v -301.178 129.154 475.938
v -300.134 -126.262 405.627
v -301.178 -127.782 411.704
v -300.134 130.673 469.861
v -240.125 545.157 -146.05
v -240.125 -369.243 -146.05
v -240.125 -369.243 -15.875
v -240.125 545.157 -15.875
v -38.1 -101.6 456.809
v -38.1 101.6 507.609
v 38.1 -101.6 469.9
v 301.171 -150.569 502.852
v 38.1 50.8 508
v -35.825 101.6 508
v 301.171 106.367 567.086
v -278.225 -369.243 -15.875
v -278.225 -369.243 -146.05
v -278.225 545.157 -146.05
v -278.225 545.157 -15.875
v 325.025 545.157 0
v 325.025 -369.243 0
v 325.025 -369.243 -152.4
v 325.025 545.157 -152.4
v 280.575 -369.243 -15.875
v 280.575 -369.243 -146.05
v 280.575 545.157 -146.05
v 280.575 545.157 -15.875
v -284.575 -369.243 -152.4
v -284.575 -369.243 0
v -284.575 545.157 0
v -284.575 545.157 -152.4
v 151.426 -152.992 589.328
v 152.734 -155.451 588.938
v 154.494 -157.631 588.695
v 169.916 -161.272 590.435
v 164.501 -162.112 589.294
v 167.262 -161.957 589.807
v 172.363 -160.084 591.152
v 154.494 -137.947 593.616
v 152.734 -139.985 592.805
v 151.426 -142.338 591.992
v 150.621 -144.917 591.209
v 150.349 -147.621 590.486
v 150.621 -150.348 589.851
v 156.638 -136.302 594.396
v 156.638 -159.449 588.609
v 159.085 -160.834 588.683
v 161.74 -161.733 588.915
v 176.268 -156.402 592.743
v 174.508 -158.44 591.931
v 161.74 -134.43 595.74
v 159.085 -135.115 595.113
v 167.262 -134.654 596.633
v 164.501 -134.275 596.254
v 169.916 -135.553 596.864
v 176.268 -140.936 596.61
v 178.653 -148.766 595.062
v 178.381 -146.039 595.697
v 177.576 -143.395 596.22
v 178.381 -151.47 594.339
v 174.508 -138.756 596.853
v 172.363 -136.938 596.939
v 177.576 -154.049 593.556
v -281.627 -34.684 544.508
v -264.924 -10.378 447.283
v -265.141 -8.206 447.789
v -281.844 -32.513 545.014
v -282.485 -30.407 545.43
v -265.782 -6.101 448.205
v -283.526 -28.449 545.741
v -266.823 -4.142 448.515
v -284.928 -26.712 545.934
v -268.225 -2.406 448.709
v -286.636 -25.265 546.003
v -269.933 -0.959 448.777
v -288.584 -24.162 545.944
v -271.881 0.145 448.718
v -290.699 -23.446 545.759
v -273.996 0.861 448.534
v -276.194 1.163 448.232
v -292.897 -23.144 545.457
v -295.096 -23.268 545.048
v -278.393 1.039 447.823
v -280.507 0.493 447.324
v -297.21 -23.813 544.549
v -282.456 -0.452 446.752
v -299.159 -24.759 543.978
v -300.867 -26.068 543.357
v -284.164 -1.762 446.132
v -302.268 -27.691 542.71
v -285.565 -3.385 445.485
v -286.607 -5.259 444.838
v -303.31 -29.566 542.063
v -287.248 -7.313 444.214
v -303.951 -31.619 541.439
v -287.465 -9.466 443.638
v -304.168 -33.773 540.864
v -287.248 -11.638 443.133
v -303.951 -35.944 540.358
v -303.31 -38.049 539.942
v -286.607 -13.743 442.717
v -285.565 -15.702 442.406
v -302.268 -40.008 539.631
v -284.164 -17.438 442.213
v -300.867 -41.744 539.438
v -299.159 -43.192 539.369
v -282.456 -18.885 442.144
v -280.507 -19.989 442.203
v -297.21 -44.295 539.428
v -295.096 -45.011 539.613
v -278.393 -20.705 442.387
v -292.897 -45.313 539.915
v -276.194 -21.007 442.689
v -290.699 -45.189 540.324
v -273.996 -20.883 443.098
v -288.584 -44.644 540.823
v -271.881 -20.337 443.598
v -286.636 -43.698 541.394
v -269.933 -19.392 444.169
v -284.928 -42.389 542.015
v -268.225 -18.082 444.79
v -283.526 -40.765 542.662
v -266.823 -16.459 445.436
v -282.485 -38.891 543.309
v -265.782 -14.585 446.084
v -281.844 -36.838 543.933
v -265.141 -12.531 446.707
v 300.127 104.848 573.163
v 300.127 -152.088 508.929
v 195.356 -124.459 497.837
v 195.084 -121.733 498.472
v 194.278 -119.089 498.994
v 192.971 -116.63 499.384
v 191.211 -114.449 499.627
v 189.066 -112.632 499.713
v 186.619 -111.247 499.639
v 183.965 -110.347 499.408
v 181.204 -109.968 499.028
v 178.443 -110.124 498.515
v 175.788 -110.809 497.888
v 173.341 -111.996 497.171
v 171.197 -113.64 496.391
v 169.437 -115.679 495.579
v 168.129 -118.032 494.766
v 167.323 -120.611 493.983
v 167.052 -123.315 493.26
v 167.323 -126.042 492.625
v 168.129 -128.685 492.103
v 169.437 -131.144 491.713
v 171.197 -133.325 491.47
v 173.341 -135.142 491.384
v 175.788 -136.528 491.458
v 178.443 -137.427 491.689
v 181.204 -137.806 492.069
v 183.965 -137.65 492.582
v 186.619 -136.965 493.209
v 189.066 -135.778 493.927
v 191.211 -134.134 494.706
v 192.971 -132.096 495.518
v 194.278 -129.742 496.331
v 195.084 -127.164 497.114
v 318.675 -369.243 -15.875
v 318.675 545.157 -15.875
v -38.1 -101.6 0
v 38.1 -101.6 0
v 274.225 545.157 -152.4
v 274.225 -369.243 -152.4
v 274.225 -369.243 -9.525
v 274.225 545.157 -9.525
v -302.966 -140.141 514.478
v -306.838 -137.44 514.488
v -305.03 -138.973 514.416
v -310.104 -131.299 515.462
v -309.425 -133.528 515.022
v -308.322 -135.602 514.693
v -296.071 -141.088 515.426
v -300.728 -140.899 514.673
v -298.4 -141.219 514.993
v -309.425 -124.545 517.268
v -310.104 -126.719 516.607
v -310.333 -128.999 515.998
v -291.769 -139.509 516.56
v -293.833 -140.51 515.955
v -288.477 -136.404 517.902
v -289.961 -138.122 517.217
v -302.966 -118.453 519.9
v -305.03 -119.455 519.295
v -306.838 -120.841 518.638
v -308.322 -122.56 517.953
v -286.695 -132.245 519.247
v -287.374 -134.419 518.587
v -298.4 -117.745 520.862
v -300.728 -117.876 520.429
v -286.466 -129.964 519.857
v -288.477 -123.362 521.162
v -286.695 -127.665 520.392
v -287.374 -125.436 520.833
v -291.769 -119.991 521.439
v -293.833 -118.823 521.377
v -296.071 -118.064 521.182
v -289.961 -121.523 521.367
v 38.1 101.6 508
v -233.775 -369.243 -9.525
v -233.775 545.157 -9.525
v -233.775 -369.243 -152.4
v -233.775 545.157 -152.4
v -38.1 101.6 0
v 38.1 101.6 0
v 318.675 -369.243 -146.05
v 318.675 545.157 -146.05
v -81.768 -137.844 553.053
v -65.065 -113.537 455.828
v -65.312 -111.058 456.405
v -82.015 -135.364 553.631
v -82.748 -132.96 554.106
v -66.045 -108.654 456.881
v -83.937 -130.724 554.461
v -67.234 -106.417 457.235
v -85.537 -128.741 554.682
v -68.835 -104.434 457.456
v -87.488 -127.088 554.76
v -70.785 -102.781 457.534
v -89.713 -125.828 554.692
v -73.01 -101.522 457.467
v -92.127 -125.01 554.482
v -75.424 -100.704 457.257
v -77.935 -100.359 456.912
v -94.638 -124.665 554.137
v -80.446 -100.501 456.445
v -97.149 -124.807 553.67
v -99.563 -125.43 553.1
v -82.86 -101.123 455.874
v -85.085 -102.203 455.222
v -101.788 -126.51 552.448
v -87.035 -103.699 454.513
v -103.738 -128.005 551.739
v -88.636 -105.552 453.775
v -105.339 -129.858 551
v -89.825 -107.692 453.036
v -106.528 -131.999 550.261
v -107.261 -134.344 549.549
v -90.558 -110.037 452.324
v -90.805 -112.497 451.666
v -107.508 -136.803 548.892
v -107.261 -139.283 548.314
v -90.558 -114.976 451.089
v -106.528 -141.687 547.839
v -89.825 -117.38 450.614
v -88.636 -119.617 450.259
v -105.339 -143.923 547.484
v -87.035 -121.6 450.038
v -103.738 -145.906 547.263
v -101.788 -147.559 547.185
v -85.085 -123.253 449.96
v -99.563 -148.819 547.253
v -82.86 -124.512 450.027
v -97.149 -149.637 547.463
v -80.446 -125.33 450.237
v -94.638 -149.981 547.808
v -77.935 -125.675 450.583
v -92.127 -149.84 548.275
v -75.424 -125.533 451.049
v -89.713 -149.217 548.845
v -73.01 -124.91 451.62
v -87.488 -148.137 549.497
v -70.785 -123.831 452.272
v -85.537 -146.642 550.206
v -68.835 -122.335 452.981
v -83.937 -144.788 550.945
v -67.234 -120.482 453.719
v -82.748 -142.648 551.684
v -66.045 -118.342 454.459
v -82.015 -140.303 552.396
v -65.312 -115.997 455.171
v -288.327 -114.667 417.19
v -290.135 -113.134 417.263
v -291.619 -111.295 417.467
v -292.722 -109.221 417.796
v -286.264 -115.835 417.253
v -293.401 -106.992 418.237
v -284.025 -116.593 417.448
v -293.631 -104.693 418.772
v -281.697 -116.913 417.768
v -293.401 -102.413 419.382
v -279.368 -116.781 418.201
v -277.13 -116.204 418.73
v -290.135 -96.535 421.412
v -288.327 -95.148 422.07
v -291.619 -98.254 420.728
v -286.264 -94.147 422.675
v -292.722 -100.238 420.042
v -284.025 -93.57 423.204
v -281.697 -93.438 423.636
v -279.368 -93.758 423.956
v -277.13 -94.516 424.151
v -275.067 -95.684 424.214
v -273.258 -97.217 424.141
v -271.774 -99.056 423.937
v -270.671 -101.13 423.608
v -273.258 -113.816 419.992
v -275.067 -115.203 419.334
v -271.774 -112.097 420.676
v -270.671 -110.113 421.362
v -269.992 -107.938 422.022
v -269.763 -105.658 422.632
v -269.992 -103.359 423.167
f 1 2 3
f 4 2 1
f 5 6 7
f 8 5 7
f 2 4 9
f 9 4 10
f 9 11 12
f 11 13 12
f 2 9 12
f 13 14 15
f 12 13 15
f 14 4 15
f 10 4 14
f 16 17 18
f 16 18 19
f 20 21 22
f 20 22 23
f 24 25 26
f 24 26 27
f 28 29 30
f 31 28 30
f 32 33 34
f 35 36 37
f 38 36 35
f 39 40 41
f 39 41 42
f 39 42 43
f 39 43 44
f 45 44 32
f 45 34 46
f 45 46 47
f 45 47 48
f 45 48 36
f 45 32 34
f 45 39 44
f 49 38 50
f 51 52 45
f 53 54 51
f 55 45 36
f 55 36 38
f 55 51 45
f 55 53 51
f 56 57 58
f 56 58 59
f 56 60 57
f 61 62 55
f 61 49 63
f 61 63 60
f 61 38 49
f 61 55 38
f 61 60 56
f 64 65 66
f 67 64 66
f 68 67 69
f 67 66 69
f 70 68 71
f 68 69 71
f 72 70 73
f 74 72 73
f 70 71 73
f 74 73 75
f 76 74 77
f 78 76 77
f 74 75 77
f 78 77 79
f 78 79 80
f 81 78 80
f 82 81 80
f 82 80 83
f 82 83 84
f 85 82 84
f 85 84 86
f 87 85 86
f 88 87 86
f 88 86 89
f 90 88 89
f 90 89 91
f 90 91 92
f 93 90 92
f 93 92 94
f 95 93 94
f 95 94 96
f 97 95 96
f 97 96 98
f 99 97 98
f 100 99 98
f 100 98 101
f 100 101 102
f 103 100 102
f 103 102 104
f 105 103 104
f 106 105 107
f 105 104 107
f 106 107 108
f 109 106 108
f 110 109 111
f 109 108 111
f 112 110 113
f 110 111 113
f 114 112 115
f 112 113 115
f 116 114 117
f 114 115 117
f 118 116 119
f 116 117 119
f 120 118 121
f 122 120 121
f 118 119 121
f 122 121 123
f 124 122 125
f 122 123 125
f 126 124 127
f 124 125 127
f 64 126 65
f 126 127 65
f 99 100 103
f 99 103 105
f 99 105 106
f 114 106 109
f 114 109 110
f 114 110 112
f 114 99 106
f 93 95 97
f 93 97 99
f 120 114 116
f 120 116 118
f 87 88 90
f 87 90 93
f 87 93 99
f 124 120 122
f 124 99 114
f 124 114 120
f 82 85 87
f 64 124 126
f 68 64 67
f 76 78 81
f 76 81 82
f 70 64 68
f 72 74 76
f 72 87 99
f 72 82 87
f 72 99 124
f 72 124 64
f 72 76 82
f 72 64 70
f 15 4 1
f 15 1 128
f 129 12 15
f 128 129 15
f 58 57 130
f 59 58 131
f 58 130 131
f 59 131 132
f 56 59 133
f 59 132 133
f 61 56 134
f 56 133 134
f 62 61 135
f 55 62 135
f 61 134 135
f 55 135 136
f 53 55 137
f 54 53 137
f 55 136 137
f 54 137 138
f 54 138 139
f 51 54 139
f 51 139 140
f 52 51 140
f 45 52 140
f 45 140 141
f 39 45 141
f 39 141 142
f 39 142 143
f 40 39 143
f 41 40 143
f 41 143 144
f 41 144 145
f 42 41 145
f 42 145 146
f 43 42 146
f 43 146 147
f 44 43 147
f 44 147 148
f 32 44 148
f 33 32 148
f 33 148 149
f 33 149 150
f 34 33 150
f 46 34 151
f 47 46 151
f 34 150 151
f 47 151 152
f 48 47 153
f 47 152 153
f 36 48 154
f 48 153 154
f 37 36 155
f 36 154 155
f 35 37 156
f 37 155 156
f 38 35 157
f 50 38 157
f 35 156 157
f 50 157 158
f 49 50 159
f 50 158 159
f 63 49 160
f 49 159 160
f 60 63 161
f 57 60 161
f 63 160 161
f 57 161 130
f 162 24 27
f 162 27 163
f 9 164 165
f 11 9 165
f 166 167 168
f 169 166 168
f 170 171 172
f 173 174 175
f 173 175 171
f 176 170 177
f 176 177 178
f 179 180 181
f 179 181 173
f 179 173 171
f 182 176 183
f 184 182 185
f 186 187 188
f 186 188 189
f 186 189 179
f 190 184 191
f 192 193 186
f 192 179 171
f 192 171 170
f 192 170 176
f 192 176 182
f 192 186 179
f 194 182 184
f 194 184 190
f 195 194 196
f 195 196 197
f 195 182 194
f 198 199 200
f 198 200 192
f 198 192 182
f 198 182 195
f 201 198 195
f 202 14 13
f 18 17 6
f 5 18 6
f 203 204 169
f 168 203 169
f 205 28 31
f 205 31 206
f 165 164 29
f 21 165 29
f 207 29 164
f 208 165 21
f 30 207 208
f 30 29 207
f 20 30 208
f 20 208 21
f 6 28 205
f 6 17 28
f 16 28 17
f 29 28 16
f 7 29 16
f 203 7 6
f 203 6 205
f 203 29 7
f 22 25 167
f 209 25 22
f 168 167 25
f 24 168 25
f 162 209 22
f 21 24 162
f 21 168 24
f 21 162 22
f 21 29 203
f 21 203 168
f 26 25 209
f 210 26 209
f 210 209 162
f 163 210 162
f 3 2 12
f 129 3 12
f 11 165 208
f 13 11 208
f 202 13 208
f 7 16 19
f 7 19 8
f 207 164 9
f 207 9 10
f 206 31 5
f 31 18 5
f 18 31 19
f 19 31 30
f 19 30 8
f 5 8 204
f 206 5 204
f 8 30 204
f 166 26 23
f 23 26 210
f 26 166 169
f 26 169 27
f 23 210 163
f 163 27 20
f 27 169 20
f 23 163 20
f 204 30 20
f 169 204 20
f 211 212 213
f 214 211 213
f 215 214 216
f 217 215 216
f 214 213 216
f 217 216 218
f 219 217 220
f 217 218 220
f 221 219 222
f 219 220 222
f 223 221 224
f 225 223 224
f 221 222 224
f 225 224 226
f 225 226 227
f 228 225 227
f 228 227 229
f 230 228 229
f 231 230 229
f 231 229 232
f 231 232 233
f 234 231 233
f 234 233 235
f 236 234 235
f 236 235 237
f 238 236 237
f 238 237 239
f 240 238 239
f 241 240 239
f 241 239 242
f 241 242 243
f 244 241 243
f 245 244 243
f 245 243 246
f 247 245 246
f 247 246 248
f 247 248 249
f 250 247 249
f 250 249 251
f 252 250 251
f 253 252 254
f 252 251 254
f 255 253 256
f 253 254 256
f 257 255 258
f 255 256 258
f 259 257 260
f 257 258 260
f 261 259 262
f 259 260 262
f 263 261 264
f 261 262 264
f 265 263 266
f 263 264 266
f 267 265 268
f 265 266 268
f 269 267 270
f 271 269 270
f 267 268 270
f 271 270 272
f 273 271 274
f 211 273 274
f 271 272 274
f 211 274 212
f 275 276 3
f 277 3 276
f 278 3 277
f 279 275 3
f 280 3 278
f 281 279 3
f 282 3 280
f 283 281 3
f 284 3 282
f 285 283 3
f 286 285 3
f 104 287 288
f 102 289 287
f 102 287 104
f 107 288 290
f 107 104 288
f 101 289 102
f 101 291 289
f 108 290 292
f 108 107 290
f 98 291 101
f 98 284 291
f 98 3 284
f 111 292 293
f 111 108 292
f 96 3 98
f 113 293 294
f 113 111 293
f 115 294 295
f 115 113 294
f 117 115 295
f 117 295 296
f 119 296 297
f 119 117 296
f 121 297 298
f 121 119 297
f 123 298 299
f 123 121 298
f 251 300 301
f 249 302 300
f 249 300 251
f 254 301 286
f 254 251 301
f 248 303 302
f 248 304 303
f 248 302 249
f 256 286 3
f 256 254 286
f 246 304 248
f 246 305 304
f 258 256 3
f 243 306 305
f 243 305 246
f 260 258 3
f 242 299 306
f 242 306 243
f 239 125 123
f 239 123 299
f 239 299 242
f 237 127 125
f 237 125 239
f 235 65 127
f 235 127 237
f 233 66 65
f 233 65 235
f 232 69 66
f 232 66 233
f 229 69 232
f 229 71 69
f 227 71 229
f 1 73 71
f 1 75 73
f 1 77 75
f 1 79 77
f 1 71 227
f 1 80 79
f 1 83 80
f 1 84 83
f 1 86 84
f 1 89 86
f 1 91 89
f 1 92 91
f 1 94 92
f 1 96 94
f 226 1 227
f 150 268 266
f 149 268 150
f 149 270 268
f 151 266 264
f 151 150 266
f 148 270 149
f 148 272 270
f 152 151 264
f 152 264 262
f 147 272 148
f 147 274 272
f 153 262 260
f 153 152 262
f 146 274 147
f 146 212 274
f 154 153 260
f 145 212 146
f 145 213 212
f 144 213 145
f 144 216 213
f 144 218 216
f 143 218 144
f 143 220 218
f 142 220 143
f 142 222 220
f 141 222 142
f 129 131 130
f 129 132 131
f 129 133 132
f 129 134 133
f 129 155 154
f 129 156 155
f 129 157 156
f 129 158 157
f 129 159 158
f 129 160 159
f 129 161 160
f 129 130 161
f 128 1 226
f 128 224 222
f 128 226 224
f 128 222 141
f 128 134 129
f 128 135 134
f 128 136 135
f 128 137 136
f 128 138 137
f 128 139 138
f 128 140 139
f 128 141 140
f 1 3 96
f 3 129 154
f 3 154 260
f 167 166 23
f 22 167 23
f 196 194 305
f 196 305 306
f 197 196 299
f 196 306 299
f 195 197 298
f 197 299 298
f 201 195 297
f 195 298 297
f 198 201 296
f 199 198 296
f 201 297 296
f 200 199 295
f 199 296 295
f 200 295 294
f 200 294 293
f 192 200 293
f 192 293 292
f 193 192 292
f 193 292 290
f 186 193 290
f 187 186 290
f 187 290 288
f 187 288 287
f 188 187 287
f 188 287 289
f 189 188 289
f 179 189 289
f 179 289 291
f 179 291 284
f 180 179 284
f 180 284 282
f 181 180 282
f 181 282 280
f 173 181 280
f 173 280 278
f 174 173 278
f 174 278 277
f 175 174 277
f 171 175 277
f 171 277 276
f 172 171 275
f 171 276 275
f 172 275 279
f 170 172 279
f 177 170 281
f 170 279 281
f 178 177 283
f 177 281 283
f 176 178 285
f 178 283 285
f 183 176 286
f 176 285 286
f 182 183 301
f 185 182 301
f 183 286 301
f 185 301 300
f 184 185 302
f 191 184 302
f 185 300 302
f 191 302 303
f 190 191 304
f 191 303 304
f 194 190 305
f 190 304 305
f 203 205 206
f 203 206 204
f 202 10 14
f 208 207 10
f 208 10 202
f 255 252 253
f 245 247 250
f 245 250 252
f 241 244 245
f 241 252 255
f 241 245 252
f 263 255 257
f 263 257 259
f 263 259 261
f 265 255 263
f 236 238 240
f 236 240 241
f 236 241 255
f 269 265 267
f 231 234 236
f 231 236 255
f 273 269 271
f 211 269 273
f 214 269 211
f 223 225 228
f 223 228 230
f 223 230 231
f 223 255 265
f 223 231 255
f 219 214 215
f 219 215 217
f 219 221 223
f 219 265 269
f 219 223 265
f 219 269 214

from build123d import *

# Parameters (mm, degrees)
F0_W      = 609.6
F0_H      = 914.4
F1_DEPTH  = 152.4
F2_W      = 508
F2_H      = 142.875
F3_DEPTH  = 914.401
F4_W      = 76.2
F4_H      = 203.2
F5_DEPTH  = 508
F7_DEPTH  = 322.6759463469
F8_SIZE2  = 76.19999
F8_SIZE   = 12.69999
F9_W      = 609.6
F9_H      = 264.8433126191
F10_DEPTH = 6.35
F11_R     = 12.0984700112
F11_R_2   = 11.4258541902
F11_R_3   = 13.0475001639
F11_R_4   = 14.3473050844
F12_DEPTH = 101.6
F13_DEPTH = 25.4
F14_W     = 38.1
F14_H     = 130.175
F15_DEPTH = 914.401


# Not quite as in the source:
# - a fillet or chamfer is up to 0.001 mm smaller than in the source, because OpenCascade refuses the exact size


with BuildPart() as f1:
    # F0 (on Top) → F1 (new body)
    with BuildSketch(Plane.XY):
        with Locations((20.2250536531, 87.9569677773)):
            Rectangle(F0_W, F0_H)
    extrude(amount=-F1_DEPTH)

    # F2 (on face) → F3 (cut, through all)
    with BuildSketch(Plane.XZ.offset(369.2430322227)):
        with Locations((20.2250536531, -80.9625)):
            Rectangle(F2_W, F2_H)
    extrude(amount=-F3_DEPTH, mode=Mode.SUBTRACT)

    # F4 (on face) → F5 (join)
    with BuildSketch(Plane.XY):
        Rectangle(F4_W, F4_H)
    extrude(amount=F5_DEPTH)

    # F6 (on face) → F7 (cut, through all)
    with BuildSketch(Plane.YZ.offset(38.1)):
        Polygon((-101.6, 469.9), (50.8, 508), (-101.6, 508), align=None)
    extrude(amount=-F7_DEPTH, mode=Mode.SUBTRACT)

    # F8 (size 12.7 and 76.2 in the source; OpenCascade refuses exactly that, so slightly less here)
    f8_edges = [f1.edges().sort_by_distance(p)[0] for p in [
        (-38.1, -25.4, 488.95),
    ]]
    chamfer(f8_edges, length=F8_SIZE, length2=F8_SIZE2)

    # F9 (on face) → F10 (join)
    with BuildSketch(Plane(origin=(-76.8910670792, -111.8929380826, 447.5717523306), x_dir=(0.9863939238, -0.0398726111, 0.1594904446), z_dir=(-0.1643989873, -0.2392356668, 0.9569426674))):
        with Locations((78.4772256914, 108.3081216617)):
            Rectangle(F9_W, F9_H)
    extrude(amount=F10_DEPTH)

    # F11 (on face) → F12 (join)
    with BuildSketch(Plane(origin=(-77.9350006486, -113.4120845671, 453.6483382685), x_dir=(0.9863939238, -0.0398726111, 0.1594904446), z_dir=(-0.1643989873, -0.2392356668, 0.9569426674))):
        with Locations((-206.5722942352, 0)):
            Circle(F11_R)
        with Locations((-200.9941935539, 98.414324224)):
            Circle(F11_R_2)
        with Locations((0, 0.4072751035)):
            Circle(F11_R_3)
        with Locations((262.7131342888, 0)):
            Circle(F11_R_4)
    extrude(amount=F12_DEPTH)

    # F11 (on face) → F13 (join)
    with BuildSketch(Plane(origin=(-77.9350006486, -113.4120845671, 453.6483382685), x_dir=(0.9863939238, -0.0398726111, 0.1594904446), z_dir=(-0.1643989873, -0.2392356668, 0.9569426674))):
        with Locations((-206.5722942352, 0)):
            Circle(F11_R)
        with Locations((-200.9941935539, 98.414324224)):
            Circle(F11_R_2)
        with Locations((0, 0.4072751035)):
            Circle(F11_R_3)
        with Locations((262.7131342888, 0)):
            Circle(F11_R_4)
    extrude(amount=F13_DEPTH)

    # F14 (on face) → F15 (cut, through all)
    with BuildSketch(Plane.XZ.offset(369.2430322227)):
        with Locations((-259.1749463469, -80.9625)):
            Rectangle(F14_W, F14_H)
        with Locations((299.6250536531, -80.9625)):
            Rectangle(F14_W, F14_H)
    extrude(amount=-F15_DEPTH, mode=Mode.SUBTRACT)


solid = f1.part
